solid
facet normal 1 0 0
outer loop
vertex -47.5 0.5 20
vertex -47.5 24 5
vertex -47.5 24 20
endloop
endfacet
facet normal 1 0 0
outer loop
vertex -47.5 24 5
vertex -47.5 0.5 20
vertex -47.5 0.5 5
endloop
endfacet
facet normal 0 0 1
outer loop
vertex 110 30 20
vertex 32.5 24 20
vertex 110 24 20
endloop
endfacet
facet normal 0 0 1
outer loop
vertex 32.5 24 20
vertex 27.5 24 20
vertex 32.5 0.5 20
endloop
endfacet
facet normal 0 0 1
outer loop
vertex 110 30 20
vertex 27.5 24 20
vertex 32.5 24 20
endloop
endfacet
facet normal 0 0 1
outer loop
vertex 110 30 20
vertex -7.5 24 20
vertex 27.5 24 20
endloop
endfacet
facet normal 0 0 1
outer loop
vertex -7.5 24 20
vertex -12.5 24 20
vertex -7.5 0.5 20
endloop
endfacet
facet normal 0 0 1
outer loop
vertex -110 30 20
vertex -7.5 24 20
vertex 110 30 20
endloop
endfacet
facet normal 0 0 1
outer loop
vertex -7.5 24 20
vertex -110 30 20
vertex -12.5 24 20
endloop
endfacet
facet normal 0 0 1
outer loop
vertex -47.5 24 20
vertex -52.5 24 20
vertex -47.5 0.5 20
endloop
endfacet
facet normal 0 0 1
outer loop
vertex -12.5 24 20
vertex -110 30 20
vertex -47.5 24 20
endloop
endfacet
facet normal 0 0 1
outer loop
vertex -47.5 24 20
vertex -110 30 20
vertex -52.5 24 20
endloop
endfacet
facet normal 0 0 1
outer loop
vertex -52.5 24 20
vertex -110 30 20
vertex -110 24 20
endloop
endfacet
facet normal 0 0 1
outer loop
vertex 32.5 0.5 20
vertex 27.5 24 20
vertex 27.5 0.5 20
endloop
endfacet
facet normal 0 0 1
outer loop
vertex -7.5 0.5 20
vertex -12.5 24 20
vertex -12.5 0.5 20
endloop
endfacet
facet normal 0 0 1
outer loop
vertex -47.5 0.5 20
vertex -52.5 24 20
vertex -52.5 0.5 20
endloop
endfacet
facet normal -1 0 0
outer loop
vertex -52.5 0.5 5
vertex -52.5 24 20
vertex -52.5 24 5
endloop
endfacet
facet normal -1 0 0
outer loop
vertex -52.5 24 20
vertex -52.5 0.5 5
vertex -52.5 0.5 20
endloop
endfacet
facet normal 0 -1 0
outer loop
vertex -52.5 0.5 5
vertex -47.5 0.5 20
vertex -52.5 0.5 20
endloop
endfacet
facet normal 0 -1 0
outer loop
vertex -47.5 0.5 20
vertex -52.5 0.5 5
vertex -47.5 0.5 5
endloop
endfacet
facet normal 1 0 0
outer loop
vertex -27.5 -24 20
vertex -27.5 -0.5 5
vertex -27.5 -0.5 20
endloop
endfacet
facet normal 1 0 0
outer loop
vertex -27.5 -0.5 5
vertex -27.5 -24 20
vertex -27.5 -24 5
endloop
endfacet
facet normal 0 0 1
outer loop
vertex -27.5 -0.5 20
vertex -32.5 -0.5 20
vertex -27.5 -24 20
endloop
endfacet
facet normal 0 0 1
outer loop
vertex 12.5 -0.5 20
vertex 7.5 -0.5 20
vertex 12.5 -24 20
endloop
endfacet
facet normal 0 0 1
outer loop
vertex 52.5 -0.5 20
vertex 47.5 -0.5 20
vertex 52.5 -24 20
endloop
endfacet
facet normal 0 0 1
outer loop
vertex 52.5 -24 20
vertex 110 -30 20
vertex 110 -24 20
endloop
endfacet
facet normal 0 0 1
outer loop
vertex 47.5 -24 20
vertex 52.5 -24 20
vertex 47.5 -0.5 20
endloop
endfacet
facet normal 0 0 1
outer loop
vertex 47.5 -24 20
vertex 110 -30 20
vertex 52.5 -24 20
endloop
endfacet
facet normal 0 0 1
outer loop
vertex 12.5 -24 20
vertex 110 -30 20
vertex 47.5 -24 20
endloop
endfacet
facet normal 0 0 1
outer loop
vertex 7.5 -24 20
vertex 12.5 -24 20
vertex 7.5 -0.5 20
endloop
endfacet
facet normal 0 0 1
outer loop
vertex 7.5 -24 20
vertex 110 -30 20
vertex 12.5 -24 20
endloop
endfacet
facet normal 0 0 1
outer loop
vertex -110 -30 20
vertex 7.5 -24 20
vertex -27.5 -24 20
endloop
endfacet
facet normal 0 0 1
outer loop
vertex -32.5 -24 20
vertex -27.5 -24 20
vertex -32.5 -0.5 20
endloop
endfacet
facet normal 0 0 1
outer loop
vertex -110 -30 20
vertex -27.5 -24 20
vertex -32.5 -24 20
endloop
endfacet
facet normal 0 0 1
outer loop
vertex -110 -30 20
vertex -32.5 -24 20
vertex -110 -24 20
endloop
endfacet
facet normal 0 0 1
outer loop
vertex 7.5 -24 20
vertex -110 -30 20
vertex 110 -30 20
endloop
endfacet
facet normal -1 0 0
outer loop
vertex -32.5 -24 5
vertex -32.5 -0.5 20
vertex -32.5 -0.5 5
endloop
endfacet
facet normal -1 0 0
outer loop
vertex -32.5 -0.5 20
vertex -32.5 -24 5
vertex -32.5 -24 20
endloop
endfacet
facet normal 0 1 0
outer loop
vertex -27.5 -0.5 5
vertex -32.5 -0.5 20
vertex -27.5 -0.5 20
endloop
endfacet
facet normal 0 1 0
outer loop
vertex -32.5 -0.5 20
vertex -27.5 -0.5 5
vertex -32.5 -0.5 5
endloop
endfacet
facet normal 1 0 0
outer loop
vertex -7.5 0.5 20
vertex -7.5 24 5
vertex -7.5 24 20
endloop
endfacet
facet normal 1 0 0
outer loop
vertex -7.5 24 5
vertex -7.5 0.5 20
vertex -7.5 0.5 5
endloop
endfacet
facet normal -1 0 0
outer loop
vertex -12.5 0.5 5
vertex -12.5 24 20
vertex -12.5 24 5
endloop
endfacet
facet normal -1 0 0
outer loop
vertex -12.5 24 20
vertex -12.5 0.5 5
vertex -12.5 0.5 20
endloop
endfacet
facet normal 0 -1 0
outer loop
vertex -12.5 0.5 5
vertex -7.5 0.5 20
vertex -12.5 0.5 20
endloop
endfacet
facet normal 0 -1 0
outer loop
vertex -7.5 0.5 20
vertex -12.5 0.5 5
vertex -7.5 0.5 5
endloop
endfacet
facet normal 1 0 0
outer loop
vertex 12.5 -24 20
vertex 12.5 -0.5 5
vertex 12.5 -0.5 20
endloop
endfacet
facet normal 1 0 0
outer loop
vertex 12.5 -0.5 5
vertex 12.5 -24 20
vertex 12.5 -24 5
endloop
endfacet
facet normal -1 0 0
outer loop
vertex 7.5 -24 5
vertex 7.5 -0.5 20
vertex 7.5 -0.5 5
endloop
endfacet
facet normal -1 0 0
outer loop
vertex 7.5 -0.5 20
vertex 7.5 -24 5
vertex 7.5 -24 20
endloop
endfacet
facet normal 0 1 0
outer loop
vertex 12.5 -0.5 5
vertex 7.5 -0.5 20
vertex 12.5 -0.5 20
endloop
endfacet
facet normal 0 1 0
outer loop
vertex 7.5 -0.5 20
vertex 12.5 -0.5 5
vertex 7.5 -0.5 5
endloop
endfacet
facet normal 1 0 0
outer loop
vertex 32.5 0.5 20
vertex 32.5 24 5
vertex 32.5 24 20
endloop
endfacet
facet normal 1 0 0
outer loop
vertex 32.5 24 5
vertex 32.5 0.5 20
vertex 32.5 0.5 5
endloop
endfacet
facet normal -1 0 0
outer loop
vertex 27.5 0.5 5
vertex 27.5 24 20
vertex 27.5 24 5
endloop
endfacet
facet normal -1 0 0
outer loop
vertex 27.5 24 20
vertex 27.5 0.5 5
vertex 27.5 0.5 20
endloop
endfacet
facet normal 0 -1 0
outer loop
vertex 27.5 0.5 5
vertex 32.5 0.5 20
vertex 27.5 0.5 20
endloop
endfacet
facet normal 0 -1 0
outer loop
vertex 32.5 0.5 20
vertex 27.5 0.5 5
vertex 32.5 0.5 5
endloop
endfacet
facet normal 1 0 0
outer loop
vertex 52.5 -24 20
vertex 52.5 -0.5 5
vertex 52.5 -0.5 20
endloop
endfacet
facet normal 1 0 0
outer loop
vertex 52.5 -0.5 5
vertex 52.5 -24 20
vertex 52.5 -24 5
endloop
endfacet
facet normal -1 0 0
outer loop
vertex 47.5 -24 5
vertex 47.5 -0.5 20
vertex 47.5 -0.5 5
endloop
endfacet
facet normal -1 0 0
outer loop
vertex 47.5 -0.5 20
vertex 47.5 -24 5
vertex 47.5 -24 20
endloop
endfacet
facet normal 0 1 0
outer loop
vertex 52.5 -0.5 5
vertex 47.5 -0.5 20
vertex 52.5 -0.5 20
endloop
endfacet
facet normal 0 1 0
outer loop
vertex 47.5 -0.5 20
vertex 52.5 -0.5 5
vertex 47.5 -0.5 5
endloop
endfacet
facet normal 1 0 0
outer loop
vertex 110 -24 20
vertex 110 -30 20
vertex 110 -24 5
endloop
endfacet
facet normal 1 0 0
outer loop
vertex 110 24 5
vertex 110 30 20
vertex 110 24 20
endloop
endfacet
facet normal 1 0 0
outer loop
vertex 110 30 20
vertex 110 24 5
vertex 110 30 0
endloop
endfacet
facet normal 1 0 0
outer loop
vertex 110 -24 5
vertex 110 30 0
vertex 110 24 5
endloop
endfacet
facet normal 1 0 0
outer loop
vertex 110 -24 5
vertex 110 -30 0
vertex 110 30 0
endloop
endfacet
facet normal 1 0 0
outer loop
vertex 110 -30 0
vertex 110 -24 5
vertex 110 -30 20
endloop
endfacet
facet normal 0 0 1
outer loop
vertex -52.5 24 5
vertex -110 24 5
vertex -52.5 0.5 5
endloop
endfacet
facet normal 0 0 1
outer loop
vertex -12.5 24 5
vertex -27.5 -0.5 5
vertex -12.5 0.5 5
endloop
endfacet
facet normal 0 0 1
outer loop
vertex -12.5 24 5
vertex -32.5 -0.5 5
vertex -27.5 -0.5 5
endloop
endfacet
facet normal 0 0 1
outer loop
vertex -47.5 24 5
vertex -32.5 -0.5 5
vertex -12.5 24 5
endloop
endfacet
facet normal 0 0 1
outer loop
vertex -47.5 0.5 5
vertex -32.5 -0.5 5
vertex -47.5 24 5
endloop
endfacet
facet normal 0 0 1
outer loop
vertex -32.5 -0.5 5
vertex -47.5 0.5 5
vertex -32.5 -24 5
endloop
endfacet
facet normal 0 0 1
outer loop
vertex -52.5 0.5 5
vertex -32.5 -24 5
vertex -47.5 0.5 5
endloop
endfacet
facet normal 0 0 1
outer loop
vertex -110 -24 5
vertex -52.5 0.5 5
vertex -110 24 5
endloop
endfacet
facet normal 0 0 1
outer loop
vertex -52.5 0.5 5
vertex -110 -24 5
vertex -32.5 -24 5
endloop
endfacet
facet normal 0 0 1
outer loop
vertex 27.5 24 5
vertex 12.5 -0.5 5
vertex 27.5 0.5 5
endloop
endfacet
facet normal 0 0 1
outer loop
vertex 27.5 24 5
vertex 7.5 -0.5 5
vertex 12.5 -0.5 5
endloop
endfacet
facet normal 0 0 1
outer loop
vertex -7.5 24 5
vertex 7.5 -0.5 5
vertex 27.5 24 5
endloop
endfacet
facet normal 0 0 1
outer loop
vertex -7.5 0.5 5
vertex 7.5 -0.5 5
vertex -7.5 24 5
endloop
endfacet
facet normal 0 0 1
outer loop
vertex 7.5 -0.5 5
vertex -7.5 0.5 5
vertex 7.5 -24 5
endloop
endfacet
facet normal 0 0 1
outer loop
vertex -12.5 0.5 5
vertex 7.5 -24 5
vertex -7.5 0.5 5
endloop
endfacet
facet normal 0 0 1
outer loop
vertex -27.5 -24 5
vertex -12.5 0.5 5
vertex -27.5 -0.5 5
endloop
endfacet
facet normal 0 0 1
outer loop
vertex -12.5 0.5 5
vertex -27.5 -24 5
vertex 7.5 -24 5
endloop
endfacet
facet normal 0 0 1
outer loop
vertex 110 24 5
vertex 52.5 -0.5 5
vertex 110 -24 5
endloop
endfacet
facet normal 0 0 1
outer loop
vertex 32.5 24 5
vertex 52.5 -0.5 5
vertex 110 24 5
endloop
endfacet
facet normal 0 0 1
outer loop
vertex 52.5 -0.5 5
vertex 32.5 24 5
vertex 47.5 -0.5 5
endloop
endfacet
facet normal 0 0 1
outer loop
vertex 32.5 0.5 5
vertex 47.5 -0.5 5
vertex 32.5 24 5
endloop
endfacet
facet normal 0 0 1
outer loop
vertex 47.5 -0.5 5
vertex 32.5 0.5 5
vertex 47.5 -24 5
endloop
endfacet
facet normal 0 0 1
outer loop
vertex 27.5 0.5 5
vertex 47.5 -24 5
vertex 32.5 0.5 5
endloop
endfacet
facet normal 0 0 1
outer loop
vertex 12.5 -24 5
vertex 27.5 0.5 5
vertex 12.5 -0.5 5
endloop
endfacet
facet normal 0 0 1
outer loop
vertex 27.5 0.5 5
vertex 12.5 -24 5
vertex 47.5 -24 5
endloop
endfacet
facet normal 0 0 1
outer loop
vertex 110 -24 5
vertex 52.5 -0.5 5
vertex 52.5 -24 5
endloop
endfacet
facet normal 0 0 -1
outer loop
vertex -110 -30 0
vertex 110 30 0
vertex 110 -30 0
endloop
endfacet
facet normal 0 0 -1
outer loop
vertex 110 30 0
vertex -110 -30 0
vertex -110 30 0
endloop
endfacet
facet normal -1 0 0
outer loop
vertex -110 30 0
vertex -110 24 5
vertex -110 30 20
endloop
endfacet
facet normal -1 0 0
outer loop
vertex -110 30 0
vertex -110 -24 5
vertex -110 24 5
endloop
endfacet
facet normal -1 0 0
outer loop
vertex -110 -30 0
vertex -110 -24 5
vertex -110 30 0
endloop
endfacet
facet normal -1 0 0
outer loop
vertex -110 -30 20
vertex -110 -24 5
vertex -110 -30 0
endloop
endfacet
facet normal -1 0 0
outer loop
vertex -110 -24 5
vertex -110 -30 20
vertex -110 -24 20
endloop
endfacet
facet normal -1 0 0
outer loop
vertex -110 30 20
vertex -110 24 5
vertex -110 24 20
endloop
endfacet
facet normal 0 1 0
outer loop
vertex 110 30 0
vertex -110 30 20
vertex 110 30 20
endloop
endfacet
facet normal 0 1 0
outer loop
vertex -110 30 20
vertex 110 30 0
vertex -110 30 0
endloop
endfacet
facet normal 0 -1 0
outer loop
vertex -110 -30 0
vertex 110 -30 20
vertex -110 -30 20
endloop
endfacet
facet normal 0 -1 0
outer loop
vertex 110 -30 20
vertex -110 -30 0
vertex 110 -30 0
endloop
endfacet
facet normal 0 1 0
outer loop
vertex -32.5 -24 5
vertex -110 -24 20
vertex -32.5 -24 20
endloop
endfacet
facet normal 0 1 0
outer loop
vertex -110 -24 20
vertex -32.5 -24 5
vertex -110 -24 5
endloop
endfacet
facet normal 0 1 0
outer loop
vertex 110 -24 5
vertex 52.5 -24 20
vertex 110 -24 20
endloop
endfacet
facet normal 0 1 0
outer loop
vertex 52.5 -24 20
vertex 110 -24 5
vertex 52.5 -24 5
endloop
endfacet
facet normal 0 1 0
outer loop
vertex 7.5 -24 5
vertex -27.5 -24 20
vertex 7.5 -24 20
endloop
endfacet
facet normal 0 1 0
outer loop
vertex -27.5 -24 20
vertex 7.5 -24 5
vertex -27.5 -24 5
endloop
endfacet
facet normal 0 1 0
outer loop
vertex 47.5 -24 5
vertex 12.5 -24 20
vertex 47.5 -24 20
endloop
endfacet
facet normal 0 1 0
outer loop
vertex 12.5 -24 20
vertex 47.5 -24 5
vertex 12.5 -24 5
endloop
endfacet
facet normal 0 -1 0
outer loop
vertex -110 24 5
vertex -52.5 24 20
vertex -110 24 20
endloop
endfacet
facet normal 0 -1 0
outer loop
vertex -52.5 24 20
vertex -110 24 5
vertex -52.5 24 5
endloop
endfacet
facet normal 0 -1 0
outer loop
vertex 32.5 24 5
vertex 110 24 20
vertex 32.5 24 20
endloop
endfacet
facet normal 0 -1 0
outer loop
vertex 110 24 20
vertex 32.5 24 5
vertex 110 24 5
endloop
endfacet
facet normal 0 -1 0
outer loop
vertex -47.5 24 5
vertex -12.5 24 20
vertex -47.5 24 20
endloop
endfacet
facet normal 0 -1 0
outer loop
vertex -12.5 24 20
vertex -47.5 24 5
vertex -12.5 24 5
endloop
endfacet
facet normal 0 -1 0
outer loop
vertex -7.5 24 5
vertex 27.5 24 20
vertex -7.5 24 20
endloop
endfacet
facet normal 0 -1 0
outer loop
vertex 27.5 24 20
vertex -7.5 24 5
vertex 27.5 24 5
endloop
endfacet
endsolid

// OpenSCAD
$fn = 32;

// ----------------------------------------------------------------------
// Rib frame 220 x 60 x 20
// 6 ribs at 20 mm pitch, staggered
// ----------------------------------------------------------------------

// --- parameters (mm) ---
frame = [220, 60, 5];  // base plate size (x, y, z)
rail_w = 6;            // side rail width
ribs = 6;              // number of ribs
rib_t = 5;             // rib thickness
rib_h = 15;            // rib height above the base plate
pitch = 20;            // pitch between rib centres

// --- derived feature positions (mm) ---
span = (ribs - 1) * pitch;          // = 100   distance between the outer ribs
origin_x = -span / 2;               // = -50   X of the first rib
rib_len = frame[1] / 2 - rail_w + 0.5;  // = 24.5   length of a staggered rib
rib_y = 0.5 + rib_len / 2;          // = 12.75   Y of a staggered rib centre
row_offset = 2 * rib_y;             // = 25.5   distance between the two rows
feature_centers = [
  [origin_x + 0 * pitch, rib_y],
  [origin_x + 1 * pitch, -rib_y],
  [origin_x + 2 * pitch, rib_y],
  [origin_x + 3 * pitch, -rib_y],
  [origin_x + 4 * pitch, rib_y],
  [origin_x + 5 * pitch, -rib_y]
];   // rib centre line, drives the rib loop

// base plate, two side rails, then the ribs read straight off feature_centers
union() {
  translate([-frame[0] / 2, -frame[1] / 2, 0]) cube(frame);
  translate([-frame[0] / 2, -frame[1] / 2, 0]) cube([frame[0], rail_w, frame[2] + rib_h]);
  translate([-frame[0] / 2, frame[1] / 2 - rail_w, 0]) cube([frame[0], rail_w, frame[2] + rib_h]);
  for (centre = feature_centers)
    translate([centre[0] - rib_t / 2, centre[1] - rib_len / 2, frame[2] - 1])
      cube([rib_t, rib_len, rib_h + 1]);
}
